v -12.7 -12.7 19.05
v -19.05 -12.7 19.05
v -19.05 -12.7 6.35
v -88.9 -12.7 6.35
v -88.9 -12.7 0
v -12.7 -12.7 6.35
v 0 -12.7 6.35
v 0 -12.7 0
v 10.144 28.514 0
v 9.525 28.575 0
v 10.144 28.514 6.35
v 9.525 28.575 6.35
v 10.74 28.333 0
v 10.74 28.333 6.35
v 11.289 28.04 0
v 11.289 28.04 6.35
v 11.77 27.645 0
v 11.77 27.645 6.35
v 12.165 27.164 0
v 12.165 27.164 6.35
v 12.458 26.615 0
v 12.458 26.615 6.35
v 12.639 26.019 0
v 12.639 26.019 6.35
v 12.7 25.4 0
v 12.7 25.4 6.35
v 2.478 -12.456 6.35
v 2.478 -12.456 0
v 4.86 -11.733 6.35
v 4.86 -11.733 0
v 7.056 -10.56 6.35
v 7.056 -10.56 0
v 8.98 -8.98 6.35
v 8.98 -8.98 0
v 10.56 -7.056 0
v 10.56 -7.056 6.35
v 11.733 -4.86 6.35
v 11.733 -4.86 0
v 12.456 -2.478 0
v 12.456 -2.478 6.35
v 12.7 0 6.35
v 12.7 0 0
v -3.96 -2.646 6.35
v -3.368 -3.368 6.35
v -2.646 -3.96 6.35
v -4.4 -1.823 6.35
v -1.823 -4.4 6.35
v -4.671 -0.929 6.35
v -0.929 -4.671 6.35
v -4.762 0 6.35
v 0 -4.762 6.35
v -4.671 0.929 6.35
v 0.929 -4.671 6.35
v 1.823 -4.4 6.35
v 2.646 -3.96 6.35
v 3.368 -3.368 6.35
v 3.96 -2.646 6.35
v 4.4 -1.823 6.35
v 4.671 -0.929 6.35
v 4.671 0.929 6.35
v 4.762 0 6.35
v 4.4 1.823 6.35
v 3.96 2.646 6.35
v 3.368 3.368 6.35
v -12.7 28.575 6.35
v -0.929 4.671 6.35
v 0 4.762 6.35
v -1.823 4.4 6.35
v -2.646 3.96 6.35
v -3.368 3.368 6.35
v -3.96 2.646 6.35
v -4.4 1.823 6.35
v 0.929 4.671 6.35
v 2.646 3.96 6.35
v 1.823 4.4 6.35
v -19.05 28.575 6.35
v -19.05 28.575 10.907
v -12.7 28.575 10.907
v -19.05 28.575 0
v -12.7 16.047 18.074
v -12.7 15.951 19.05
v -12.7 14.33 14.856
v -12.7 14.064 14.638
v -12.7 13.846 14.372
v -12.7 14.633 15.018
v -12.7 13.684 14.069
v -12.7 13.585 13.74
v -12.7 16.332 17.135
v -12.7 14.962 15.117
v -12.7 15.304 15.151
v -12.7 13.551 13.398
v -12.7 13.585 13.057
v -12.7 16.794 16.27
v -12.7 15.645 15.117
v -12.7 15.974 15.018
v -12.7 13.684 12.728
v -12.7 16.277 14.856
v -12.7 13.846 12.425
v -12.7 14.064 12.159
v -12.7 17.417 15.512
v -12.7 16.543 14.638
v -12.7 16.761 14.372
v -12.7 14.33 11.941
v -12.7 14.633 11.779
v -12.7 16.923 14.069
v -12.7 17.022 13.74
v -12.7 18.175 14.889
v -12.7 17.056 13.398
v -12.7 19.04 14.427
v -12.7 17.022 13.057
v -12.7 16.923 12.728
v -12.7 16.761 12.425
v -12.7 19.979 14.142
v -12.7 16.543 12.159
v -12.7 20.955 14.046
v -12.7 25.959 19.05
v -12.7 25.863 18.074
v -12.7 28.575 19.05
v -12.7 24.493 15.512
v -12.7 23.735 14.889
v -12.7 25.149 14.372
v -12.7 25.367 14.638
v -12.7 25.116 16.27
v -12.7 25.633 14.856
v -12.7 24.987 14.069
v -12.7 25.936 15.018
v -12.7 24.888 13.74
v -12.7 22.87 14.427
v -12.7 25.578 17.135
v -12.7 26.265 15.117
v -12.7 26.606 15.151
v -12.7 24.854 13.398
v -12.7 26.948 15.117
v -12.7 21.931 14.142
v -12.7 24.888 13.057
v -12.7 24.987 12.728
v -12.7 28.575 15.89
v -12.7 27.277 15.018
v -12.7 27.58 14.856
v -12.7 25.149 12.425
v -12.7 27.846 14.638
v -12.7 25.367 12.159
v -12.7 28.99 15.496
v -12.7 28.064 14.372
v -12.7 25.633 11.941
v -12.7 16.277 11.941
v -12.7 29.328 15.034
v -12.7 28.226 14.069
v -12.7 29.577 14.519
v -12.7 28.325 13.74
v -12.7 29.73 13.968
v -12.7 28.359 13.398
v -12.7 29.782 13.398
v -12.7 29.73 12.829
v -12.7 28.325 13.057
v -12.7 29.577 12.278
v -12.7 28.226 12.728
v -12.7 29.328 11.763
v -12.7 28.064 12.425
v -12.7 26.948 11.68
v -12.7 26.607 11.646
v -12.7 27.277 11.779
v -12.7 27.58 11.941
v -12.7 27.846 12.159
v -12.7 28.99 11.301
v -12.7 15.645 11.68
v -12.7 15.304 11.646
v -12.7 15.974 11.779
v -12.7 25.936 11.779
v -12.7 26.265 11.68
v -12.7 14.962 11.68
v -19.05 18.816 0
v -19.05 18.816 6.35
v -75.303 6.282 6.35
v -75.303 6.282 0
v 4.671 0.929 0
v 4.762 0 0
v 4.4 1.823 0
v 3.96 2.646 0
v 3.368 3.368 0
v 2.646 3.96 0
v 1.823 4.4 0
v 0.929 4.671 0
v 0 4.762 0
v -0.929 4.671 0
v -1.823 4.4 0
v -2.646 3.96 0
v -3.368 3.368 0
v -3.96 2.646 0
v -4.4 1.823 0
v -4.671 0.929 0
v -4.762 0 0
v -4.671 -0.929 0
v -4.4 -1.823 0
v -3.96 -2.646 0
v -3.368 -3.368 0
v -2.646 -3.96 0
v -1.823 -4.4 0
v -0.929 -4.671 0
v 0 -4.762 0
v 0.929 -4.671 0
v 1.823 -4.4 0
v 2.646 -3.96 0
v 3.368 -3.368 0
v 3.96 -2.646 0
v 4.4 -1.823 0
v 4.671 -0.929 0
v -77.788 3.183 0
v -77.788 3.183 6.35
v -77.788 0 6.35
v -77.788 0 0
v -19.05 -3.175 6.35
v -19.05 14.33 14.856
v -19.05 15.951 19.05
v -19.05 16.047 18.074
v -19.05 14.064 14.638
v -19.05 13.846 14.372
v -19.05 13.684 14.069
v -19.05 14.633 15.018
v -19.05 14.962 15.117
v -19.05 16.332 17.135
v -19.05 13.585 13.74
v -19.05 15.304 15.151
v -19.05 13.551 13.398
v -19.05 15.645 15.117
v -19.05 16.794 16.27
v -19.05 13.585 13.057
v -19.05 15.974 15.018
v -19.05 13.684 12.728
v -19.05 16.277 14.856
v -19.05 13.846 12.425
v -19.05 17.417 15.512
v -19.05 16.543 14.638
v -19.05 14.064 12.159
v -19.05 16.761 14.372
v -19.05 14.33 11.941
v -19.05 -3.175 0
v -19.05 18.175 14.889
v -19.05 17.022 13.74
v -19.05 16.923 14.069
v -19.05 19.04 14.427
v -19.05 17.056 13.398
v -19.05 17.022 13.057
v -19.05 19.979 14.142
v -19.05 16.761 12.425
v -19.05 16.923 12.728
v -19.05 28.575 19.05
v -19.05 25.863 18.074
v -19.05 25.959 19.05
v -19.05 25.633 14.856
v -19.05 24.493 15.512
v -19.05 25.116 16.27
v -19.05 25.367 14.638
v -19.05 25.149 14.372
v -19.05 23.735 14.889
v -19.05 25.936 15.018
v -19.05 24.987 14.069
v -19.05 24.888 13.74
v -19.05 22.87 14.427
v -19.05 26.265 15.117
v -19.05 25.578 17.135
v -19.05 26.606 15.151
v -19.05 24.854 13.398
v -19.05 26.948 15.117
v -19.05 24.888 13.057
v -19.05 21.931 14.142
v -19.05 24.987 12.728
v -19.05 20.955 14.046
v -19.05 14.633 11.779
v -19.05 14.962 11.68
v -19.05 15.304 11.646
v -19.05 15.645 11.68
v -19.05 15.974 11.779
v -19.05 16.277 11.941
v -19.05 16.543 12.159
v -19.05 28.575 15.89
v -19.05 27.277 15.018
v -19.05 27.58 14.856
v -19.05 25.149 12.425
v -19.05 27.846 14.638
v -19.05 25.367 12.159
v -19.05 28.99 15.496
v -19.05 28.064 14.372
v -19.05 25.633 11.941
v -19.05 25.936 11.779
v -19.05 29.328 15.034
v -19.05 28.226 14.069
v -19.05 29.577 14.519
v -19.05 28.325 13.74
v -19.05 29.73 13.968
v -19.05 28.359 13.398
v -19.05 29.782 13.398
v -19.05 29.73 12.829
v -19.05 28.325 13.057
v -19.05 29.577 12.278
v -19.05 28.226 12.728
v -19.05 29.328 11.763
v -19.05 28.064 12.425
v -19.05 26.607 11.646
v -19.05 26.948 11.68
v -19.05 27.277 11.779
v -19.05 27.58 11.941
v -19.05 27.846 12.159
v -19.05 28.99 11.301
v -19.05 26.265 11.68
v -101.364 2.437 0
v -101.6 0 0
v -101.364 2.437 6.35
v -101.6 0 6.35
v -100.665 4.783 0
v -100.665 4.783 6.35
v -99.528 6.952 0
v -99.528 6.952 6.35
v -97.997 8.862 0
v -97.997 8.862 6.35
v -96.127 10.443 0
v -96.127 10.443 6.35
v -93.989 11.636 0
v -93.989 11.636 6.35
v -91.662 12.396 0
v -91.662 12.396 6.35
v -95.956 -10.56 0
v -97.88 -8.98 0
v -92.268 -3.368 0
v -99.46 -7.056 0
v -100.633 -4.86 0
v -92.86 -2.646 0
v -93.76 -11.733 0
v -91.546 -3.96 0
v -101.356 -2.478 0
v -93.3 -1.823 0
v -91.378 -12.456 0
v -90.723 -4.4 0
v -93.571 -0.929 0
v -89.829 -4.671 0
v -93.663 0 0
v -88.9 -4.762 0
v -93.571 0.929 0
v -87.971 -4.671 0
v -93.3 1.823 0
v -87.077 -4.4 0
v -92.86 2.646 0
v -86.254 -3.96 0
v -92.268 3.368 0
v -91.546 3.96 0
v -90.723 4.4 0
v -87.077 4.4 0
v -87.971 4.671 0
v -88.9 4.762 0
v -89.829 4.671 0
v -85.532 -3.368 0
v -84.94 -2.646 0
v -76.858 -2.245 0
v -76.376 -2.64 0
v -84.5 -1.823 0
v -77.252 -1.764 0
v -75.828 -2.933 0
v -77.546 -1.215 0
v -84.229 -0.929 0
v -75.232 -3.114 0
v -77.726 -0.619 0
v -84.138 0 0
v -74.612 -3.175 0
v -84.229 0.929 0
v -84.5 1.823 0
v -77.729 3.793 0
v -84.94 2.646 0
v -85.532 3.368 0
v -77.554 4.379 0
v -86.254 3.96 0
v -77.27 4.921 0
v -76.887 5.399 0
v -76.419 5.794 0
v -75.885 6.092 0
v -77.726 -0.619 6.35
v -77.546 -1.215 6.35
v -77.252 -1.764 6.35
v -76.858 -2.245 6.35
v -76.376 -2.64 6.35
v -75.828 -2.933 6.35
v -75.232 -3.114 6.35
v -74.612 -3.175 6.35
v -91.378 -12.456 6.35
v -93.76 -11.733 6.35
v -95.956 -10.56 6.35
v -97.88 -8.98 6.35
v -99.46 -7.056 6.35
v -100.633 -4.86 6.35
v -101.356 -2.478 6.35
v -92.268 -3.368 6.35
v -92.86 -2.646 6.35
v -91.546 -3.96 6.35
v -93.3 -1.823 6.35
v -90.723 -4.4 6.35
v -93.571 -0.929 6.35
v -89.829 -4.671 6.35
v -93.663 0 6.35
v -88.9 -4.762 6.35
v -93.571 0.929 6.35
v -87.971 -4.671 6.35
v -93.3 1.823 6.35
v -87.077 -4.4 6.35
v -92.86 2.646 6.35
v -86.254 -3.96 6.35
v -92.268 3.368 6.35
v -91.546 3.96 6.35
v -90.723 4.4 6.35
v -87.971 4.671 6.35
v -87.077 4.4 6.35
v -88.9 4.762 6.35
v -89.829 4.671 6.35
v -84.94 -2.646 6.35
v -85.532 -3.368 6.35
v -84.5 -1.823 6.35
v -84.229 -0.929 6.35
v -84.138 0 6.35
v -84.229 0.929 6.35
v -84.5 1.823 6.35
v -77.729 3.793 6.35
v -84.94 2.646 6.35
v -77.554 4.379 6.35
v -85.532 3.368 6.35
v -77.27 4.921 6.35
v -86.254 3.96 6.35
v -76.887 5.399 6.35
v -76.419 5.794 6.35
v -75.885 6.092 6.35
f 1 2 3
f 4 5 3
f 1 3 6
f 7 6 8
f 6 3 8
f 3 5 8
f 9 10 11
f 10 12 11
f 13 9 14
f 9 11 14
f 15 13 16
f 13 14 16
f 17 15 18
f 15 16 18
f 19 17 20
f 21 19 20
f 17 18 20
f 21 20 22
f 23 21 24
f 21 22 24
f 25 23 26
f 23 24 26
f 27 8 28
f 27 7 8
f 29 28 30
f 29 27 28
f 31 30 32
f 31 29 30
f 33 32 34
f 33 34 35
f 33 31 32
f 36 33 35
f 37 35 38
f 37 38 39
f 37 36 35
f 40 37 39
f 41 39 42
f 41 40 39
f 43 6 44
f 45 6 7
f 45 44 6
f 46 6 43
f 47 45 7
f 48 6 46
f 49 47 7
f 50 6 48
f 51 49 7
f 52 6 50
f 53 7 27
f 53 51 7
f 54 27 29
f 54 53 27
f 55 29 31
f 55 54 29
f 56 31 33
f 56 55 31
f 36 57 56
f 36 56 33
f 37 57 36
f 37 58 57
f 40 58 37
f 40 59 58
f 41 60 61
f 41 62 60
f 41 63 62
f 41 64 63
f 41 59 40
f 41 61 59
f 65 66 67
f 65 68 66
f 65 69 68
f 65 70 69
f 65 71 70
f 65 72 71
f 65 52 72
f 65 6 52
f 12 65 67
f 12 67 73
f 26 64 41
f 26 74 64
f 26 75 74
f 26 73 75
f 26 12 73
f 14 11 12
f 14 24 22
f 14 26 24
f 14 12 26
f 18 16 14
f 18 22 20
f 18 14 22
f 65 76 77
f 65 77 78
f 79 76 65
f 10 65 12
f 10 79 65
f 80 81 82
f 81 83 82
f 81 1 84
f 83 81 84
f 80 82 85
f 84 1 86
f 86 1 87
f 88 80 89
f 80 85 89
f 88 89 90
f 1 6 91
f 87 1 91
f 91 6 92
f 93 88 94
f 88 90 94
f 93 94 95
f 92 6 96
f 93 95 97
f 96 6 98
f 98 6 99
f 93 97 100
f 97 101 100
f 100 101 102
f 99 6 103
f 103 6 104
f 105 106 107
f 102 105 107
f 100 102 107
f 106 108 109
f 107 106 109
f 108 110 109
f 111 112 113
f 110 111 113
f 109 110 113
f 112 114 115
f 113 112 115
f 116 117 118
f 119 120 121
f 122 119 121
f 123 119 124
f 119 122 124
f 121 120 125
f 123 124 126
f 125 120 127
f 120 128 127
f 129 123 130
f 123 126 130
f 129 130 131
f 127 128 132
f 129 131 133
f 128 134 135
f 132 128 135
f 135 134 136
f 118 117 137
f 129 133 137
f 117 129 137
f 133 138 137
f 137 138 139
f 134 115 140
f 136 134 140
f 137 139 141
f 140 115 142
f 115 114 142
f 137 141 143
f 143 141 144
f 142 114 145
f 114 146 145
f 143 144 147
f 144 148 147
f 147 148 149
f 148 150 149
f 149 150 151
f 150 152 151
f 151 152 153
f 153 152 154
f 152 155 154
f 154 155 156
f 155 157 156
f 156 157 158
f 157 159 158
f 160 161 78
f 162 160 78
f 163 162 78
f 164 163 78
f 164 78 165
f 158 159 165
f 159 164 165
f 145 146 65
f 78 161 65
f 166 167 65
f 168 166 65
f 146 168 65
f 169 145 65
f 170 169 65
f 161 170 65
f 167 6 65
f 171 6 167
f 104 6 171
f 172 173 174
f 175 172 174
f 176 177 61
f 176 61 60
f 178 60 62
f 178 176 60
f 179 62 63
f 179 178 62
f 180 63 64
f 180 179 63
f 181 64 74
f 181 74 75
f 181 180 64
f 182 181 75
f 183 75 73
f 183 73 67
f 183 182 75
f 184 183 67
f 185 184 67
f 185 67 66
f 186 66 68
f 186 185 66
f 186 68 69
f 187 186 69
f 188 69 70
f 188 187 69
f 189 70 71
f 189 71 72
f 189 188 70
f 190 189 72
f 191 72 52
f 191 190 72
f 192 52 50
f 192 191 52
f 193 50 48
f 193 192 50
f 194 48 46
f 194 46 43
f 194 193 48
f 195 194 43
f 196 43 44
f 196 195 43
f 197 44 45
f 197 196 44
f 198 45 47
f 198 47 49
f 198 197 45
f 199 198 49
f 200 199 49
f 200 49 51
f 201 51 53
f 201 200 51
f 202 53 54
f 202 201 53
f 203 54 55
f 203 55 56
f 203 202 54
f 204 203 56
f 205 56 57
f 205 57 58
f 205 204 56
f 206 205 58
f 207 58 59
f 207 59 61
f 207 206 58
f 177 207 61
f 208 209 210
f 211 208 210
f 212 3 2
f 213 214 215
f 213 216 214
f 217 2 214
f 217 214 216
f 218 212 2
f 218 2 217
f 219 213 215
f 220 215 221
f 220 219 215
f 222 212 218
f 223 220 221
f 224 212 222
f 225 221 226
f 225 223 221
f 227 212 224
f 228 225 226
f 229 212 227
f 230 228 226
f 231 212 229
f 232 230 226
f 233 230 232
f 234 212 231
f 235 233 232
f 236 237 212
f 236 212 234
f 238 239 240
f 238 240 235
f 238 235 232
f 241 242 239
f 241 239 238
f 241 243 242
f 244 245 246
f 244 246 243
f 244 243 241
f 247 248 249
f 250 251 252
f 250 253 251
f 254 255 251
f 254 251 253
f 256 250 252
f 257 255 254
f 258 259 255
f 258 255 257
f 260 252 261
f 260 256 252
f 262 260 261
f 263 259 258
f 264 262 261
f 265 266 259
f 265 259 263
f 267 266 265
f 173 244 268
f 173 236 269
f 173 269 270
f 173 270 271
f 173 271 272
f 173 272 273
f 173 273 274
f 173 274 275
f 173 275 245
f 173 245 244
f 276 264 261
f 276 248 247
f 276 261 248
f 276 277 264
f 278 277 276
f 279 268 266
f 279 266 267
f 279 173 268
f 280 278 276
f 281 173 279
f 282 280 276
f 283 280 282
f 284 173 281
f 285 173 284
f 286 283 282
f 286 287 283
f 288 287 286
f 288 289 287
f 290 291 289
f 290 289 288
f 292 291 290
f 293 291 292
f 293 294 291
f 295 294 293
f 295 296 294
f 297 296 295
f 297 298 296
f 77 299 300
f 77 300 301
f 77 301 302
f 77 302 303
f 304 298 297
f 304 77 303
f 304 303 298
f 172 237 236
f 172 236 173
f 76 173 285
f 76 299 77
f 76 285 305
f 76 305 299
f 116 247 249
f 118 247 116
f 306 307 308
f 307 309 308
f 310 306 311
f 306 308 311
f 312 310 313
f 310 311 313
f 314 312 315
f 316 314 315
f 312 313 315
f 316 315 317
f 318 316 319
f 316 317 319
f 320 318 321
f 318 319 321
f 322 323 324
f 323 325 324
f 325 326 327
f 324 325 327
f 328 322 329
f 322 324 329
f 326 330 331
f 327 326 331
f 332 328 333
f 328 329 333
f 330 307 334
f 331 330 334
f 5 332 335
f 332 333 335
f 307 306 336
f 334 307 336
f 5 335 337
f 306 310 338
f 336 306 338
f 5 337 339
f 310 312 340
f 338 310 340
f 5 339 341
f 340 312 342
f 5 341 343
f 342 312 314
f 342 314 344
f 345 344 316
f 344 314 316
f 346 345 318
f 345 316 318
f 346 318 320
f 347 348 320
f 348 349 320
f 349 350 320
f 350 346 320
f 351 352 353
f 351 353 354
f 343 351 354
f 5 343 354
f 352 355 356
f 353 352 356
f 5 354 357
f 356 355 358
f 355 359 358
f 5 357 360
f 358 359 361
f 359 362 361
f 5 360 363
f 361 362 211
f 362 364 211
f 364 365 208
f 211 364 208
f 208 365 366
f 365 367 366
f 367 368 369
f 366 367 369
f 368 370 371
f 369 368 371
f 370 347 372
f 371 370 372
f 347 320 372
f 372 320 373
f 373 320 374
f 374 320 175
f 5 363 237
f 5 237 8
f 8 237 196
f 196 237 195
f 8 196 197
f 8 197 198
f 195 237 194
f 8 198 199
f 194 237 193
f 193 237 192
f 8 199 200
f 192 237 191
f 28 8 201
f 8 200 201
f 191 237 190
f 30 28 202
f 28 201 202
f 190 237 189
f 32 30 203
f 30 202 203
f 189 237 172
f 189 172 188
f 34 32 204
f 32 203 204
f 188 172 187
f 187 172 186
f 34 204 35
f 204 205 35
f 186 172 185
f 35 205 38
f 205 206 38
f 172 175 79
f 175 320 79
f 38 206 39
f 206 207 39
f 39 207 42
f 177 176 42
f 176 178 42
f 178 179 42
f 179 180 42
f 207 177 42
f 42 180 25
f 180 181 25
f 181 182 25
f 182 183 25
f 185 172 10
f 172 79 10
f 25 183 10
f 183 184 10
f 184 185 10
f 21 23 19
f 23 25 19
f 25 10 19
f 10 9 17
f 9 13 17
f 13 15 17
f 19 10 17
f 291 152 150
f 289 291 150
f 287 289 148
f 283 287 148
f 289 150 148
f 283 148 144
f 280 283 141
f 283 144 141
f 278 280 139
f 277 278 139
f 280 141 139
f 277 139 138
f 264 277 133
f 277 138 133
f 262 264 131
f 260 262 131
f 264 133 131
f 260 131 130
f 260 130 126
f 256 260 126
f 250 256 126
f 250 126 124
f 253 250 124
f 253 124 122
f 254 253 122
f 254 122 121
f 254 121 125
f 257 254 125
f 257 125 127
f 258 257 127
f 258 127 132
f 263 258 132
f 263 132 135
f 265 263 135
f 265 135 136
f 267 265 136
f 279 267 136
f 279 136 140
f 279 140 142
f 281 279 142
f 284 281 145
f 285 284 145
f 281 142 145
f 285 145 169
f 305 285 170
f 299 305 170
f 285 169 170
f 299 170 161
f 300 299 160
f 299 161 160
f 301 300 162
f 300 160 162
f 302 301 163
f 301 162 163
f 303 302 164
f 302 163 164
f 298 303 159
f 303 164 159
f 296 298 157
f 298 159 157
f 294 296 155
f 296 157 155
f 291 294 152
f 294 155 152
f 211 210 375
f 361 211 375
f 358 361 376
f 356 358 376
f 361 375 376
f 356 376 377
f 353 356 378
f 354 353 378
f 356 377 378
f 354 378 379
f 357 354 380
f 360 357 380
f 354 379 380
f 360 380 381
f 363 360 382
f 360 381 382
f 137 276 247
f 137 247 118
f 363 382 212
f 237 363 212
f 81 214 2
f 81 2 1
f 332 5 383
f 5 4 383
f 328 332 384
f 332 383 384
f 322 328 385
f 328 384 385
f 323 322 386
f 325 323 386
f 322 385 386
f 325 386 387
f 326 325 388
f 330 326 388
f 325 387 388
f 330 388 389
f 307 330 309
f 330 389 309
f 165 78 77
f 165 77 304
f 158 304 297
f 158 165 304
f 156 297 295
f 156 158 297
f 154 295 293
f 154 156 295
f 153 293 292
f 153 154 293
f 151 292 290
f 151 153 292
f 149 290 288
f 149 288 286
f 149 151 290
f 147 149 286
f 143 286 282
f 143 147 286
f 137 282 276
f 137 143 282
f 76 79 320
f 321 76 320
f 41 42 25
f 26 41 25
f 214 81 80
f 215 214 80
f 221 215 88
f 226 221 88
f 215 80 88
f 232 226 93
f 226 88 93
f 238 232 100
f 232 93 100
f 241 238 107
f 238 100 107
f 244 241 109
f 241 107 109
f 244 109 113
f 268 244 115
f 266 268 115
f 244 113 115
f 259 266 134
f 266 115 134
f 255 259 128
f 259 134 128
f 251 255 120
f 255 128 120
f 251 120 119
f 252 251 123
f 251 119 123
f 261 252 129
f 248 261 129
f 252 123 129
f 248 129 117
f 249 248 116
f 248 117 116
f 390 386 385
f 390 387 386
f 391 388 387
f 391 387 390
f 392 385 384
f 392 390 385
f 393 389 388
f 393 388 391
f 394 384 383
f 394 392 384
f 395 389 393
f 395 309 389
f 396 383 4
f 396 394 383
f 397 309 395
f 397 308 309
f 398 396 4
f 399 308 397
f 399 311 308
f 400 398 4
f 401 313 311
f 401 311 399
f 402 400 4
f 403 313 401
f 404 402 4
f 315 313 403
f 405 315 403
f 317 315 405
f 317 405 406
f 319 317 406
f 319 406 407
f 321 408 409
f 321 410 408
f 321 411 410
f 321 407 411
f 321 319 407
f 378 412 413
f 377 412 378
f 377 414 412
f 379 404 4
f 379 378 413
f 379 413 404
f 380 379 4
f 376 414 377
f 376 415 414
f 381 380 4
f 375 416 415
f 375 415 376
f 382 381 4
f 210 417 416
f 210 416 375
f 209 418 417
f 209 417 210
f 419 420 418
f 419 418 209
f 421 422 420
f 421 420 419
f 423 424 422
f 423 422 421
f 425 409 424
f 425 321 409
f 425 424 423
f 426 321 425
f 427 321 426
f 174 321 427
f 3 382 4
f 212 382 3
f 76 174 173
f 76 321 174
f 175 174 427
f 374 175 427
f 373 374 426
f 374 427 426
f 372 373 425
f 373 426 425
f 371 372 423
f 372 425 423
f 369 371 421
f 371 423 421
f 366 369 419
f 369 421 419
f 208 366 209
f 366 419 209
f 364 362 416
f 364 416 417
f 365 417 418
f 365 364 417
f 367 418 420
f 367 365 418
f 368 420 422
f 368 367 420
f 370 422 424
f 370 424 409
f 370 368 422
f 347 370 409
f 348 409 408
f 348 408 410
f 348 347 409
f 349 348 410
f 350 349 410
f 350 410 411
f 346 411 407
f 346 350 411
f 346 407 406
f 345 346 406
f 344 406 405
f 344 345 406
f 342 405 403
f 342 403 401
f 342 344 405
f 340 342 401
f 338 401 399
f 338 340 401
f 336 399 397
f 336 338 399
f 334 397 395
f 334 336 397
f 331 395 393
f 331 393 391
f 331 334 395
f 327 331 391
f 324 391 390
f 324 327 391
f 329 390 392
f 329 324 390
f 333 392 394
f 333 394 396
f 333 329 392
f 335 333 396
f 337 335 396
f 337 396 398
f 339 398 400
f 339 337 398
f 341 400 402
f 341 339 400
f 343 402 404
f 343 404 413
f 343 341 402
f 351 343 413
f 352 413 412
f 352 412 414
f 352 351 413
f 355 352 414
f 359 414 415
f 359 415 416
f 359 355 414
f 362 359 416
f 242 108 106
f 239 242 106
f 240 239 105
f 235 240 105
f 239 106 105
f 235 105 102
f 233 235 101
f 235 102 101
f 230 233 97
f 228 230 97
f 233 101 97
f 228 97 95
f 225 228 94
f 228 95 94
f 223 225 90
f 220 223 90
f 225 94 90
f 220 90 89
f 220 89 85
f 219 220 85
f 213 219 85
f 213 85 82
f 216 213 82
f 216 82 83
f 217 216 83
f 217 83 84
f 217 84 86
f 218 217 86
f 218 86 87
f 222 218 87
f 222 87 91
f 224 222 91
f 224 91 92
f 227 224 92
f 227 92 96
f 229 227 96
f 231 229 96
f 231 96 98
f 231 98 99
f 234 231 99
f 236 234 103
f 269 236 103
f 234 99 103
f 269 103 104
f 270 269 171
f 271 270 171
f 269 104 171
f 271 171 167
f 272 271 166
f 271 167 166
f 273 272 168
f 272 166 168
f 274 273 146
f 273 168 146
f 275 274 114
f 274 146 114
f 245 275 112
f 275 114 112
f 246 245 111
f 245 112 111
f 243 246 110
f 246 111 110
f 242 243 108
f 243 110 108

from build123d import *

# Parameters (mm, degrees)
F0_R      = 4.7625
F1_DEPTH  = 6.35
F2_R      = 12.69999
F3_W      = 6.35
F3_H      = 41.275
F4_DEPTH  = 12.7
F6_DEPTH  = 25.4
F7_R      = 3.175
F8_R      = 5.0038
F8_R_2    = 1.7526
F9_DEPTH  = 25.4
F11_DEPTH = 6.35


# Not quite as in the source:
# - a fillet or chamfer is up to 0.001 mm smaller than in the source, because OpenCascade refuses the exact size


with BuildPart() as f1:
    # F0 (on Top) → F1 (new body)
    with BuildSketch(Plane.XY):
        Polygon((-101.6, -12.7), (12.7, -12.7), (12.7, 28.575), (-19.05, 28.575), (-101.6, 10.1816951473), align=None)
        with Locations((-88.9, 0)):
            Circle(F0_R, mode=Mode.SUBTRACT)
        Circle(F0_R, mode=Mode.SUBTRACT)
    extrude(amount=F1_DEPTH)

    # F2 (radius 12.7 in the source; OpenCascade refuses exactly that, so slightly less here)
    f2_edges = [f1.edges().sort_by_distance(p)[0] for p in [
        (12.7, -12.7, 3.175),
        (-101.6, -12.7, 3.175),
        (-101.6, 10.181695, 3.175),
    ]]
    fillet(f2_edges, radius=F2_R)

    # F3 (on face) → F4 (join)
    with BuildSketch(Plane.XY.offset(6.35)):
        with Locations((-15.875, 7.9375)):
            Rectangle(F3_W, F3_H)
    extrude(amount=F4_DEPTH)

    # F5 (on face) → F6 (cut)
    with BuildSketch(Plane.XY.offset(6.35)):
        with BuildLine():
            Line((-19.05, 18.8164242334), (-75.3030020415, 6.2824615995))
            ThreePointArc((-75.3030020415, 6.2824615995), (-77.0896928651, 5.1694426385), (-77.7875, 3.1834566091))
            Line((-77.7875, 3.1834566091), (-77.7875, 0))
            ThreePointArc((-77.7875, 0), (-76.8575640303, -2.2450640303), (-74.6125, -3.175))
            Line((-74.6125, -3.175), (-19.05, -3.175))
            Line((-19.05, -3.175), (-19.05, 18.8164242334))
        make_face()
    extrude(amount=-F6_DEPTH, mode=Mode.SUBTRACT)

    # F7
    f7_edges = [f1.edges().sort_by_distance(p)[0] for p in [
        (12.7, 28.575, 3.175),
    ]]
    fillet(f7_edges, radius=F7_R)

    # F8 (on face) → F9 (cut)
    with BuildSketch(Plane.YZ.offset(-12.7)):
        with Locations((20.955, 19.05)):
            Circle(F8_R)
        with Locations((26.6065, 13.3985)):
            Circle(F8_R_2)
        with Locations((15.3035, 13.3985)):
            Circle(F8_R_2)
    extrude(amount=-F9_DEPTH, mode=Mode.SUBTRACT)

    # F10 (on face) → F11 (join)
    with BuildSketch(Plane.YZ.offset(-12.7)):
        with BuildLine():
            Line((28.575, 15.8896107462), (28.575, 10.9073892538))
            ThreePointArc((28.575, 10.9073892538), (29.7815, 13.3985), (28.575, 15.8896107462))
        make_face()
    extrude(amount=-F11_DEPTH)


solid = f1.part
